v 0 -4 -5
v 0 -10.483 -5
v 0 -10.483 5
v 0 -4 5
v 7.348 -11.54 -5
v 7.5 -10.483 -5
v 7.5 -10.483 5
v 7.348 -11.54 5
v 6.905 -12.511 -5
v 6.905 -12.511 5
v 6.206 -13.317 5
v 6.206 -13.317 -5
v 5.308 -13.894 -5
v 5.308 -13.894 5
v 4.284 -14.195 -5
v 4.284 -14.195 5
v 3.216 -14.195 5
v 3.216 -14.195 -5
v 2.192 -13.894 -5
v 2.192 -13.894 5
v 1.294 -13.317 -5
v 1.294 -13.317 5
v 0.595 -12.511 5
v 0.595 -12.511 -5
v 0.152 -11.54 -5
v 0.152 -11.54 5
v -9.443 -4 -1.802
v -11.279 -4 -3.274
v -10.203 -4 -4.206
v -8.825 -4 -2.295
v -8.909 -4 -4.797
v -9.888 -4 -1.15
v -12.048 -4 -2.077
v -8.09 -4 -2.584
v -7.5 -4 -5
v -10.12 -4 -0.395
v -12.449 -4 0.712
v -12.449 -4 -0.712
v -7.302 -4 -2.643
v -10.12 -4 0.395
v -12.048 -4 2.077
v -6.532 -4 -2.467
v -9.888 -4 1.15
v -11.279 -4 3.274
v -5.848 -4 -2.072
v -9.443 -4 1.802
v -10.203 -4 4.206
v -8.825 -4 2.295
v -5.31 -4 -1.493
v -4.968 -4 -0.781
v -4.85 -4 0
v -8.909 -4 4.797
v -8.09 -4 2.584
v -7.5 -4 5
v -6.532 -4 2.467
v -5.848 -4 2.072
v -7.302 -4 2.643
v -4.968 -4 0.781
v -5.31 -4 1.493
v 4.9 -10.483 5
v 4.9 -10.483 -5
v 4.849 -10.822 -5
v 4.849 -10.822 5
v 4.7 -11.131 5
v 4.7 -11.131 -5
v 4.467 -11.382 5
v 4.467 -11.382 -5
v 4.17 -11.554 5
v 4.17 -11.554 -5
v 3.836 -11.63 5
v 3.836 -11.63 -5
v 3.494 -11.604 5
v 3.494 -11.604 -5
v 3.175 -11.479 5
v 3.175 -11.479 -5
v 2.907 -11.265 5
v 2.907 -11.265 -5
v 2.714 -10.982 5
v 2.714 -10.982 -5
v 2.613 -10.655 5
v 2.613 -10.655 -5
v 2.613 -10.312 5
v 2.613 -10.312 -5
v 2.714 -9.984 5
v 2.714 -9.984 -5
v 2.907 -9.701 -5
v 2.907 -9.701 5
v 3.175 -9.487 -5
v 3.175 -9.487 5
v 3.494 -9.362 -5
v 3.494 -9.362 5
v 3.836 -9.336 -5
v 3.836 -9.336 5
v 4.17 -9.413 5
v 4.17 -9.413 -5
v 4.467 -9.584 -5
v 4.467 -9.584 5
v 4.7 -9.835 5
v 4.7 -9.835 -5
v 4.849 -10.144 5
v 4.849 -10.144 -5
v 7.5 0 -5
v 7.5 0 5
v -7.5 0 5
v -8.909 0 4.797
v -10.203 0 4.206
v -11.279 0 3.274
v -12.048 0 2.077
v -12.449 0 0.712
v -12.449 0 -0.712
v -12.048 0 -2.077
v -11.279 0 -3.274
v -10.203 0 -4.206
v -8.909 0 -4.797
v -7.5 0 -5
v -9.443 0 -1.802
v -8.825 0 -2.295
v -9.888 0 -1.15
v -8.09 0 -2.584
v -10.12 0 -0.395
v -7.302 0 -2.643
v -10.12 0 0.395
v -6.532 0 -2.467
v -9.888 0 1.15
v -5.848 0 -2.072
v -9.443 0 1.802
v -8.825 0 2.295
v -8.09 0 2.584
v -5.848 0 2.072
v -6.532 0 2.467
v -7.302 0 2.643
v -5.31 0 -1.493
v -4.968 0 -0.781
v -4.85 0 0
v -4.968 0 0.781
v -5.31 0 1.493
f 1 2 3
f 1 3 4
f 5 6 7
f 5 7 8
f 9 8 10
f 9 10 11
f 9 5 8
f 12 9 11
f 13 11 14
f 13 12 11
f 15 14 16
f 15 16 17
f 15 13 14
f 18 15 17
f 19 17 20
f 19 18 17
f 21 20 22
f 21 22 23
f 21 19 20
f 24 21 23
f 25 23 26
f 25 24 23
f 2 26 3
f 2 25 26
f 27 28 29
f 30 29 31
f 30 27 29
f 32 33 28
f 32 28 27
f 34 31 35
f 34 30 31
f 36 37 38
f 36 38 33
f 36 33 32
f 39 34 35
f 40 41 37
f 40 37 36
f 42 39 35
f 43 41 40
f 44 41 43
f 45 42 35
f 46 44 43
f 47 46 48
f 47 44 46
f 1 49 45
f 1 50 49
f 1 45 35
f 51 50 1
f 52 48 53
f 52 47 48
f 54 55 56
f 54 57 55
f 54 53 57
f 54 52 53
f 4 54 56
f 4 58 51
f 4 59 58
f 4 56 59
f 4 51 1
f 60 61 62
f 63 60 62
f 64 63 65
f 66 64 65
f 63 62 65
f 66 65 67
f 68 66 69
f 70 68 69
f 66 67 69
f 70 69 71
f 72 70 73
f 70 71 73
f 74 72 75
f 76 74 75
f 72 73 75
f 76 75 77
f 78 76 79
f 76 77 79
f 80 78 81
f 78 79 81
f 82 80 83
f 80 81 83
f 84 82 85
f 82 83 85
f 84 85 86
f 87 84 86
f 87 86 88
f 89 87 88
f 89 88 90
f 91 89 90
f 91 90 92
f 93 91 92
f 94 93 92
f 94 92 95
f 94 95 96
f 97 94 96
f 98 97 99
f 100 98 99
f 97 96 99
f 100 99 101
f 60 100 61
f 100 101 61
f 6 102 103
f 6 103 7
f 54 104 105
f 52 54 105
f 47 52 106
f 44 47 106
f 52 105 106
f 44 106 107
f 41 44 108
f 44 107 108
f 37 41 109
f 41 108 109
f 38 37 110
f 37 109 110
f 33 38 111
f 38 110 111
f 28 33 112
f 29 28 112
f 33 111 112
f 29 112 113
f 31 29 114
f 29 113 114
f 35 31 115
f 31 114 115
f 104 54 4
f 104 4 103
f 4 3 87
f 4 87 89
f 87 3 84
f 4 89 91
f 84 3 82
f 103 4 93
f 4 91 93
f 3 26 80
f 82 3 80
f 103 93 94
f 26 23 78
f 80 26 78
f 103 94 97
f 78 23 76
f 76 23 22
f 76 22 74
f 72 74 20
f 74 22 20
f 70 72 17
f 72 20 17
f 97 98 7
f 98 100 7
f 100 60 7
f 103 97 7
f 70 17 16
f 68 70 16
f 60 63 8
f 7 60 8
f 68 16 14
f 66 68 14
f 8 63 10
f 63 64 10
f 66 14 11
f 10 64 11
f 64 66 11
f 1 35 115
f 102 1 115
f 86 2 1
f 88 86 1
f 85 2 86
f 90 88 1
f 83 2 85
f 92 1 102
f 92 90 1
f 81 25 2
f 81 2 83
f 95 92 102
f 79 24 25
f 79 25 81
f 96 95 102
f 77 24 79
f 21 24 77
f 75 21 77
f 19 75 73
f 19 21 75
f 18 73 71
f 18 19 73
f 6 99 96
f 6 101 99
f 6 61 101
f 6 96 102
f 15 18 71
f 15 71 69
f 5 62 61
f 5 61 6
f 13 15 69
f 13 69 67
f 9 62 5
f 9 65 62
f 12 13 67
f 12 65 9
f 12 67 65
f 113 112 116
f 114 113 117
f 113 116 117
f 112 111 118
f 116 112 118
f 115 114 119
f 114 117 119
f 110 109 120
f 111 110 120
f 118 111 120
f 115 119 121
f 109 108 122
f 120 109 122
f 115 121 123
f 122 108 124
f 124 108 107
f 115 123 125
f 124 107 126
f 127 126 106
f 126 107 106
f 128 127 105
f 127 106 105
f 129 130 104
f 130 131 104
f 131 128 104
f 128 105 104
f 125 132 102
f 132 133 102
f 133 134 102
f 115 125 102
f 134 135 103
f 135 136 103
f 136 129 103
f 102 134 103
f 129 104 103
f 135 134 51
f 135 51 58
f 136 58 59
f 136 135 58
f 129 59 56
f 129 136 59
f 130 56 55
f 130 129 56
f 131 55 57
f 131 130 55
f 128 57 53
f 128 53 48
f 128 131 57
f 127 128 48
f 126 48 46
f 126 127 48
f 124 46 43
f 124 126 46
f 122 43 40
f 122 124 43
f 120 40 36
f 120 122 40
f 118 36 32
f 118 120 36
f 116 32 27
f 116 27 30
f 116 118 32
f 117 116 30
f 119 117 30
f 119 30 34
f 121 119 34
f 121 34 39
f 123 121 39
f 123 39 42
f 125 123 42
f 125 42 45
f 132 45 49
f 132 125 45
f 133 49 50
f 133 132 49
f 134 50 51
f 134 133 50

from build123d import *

# Parameters (mm, degrees)
F0_R     = 2.65
F1_DEPTH = 4
F2_R     = 1.15
F3_DEPTH = 10


with BuildPart() as f1:
    # F0 (on Front) → F1 (new body)
    with BuildSketch(Plane.XZ):
        with BuildLine():
            Line((-7.5, -5), (7.5, -5))
            Line((7.5, -5), (7.5, 5))
            Line((7.5, 5), (-7.5, 5))
            ThreePointArc((-7.5, 5), (-12.5, 0), (-7.5, -5))
        make_face()
        with Locations((-7.5, 0)):
            Circle(F0_R, mode=Mode.SUBTRACT)
    extrude(amount=F1_DEPTH)

    # F2 (on face) → F3 (join, through all)
    with BuildSketch(Plane(origin=(0, 0, -5), x_dir=(1, 0, 0), z_dir=(0, 0, -1))):
        with BuildLine():
            Line((0, 4), (7.5, 4))
            Line((7.5, 4), (7.5, 10.48325))
            ThreePointArc((7.5, 10.48325), (3.75, 14.23325), (0, 10.48325))
            Line((0, 10.48325), (0, 4))
        make_face()
        with Locations((3.75, 10.48325)):
            Circle(F2_R, mode=Mode.SUBTRACT)
    extrude(amount=-F3_DEPTH)


solid = f1.part
